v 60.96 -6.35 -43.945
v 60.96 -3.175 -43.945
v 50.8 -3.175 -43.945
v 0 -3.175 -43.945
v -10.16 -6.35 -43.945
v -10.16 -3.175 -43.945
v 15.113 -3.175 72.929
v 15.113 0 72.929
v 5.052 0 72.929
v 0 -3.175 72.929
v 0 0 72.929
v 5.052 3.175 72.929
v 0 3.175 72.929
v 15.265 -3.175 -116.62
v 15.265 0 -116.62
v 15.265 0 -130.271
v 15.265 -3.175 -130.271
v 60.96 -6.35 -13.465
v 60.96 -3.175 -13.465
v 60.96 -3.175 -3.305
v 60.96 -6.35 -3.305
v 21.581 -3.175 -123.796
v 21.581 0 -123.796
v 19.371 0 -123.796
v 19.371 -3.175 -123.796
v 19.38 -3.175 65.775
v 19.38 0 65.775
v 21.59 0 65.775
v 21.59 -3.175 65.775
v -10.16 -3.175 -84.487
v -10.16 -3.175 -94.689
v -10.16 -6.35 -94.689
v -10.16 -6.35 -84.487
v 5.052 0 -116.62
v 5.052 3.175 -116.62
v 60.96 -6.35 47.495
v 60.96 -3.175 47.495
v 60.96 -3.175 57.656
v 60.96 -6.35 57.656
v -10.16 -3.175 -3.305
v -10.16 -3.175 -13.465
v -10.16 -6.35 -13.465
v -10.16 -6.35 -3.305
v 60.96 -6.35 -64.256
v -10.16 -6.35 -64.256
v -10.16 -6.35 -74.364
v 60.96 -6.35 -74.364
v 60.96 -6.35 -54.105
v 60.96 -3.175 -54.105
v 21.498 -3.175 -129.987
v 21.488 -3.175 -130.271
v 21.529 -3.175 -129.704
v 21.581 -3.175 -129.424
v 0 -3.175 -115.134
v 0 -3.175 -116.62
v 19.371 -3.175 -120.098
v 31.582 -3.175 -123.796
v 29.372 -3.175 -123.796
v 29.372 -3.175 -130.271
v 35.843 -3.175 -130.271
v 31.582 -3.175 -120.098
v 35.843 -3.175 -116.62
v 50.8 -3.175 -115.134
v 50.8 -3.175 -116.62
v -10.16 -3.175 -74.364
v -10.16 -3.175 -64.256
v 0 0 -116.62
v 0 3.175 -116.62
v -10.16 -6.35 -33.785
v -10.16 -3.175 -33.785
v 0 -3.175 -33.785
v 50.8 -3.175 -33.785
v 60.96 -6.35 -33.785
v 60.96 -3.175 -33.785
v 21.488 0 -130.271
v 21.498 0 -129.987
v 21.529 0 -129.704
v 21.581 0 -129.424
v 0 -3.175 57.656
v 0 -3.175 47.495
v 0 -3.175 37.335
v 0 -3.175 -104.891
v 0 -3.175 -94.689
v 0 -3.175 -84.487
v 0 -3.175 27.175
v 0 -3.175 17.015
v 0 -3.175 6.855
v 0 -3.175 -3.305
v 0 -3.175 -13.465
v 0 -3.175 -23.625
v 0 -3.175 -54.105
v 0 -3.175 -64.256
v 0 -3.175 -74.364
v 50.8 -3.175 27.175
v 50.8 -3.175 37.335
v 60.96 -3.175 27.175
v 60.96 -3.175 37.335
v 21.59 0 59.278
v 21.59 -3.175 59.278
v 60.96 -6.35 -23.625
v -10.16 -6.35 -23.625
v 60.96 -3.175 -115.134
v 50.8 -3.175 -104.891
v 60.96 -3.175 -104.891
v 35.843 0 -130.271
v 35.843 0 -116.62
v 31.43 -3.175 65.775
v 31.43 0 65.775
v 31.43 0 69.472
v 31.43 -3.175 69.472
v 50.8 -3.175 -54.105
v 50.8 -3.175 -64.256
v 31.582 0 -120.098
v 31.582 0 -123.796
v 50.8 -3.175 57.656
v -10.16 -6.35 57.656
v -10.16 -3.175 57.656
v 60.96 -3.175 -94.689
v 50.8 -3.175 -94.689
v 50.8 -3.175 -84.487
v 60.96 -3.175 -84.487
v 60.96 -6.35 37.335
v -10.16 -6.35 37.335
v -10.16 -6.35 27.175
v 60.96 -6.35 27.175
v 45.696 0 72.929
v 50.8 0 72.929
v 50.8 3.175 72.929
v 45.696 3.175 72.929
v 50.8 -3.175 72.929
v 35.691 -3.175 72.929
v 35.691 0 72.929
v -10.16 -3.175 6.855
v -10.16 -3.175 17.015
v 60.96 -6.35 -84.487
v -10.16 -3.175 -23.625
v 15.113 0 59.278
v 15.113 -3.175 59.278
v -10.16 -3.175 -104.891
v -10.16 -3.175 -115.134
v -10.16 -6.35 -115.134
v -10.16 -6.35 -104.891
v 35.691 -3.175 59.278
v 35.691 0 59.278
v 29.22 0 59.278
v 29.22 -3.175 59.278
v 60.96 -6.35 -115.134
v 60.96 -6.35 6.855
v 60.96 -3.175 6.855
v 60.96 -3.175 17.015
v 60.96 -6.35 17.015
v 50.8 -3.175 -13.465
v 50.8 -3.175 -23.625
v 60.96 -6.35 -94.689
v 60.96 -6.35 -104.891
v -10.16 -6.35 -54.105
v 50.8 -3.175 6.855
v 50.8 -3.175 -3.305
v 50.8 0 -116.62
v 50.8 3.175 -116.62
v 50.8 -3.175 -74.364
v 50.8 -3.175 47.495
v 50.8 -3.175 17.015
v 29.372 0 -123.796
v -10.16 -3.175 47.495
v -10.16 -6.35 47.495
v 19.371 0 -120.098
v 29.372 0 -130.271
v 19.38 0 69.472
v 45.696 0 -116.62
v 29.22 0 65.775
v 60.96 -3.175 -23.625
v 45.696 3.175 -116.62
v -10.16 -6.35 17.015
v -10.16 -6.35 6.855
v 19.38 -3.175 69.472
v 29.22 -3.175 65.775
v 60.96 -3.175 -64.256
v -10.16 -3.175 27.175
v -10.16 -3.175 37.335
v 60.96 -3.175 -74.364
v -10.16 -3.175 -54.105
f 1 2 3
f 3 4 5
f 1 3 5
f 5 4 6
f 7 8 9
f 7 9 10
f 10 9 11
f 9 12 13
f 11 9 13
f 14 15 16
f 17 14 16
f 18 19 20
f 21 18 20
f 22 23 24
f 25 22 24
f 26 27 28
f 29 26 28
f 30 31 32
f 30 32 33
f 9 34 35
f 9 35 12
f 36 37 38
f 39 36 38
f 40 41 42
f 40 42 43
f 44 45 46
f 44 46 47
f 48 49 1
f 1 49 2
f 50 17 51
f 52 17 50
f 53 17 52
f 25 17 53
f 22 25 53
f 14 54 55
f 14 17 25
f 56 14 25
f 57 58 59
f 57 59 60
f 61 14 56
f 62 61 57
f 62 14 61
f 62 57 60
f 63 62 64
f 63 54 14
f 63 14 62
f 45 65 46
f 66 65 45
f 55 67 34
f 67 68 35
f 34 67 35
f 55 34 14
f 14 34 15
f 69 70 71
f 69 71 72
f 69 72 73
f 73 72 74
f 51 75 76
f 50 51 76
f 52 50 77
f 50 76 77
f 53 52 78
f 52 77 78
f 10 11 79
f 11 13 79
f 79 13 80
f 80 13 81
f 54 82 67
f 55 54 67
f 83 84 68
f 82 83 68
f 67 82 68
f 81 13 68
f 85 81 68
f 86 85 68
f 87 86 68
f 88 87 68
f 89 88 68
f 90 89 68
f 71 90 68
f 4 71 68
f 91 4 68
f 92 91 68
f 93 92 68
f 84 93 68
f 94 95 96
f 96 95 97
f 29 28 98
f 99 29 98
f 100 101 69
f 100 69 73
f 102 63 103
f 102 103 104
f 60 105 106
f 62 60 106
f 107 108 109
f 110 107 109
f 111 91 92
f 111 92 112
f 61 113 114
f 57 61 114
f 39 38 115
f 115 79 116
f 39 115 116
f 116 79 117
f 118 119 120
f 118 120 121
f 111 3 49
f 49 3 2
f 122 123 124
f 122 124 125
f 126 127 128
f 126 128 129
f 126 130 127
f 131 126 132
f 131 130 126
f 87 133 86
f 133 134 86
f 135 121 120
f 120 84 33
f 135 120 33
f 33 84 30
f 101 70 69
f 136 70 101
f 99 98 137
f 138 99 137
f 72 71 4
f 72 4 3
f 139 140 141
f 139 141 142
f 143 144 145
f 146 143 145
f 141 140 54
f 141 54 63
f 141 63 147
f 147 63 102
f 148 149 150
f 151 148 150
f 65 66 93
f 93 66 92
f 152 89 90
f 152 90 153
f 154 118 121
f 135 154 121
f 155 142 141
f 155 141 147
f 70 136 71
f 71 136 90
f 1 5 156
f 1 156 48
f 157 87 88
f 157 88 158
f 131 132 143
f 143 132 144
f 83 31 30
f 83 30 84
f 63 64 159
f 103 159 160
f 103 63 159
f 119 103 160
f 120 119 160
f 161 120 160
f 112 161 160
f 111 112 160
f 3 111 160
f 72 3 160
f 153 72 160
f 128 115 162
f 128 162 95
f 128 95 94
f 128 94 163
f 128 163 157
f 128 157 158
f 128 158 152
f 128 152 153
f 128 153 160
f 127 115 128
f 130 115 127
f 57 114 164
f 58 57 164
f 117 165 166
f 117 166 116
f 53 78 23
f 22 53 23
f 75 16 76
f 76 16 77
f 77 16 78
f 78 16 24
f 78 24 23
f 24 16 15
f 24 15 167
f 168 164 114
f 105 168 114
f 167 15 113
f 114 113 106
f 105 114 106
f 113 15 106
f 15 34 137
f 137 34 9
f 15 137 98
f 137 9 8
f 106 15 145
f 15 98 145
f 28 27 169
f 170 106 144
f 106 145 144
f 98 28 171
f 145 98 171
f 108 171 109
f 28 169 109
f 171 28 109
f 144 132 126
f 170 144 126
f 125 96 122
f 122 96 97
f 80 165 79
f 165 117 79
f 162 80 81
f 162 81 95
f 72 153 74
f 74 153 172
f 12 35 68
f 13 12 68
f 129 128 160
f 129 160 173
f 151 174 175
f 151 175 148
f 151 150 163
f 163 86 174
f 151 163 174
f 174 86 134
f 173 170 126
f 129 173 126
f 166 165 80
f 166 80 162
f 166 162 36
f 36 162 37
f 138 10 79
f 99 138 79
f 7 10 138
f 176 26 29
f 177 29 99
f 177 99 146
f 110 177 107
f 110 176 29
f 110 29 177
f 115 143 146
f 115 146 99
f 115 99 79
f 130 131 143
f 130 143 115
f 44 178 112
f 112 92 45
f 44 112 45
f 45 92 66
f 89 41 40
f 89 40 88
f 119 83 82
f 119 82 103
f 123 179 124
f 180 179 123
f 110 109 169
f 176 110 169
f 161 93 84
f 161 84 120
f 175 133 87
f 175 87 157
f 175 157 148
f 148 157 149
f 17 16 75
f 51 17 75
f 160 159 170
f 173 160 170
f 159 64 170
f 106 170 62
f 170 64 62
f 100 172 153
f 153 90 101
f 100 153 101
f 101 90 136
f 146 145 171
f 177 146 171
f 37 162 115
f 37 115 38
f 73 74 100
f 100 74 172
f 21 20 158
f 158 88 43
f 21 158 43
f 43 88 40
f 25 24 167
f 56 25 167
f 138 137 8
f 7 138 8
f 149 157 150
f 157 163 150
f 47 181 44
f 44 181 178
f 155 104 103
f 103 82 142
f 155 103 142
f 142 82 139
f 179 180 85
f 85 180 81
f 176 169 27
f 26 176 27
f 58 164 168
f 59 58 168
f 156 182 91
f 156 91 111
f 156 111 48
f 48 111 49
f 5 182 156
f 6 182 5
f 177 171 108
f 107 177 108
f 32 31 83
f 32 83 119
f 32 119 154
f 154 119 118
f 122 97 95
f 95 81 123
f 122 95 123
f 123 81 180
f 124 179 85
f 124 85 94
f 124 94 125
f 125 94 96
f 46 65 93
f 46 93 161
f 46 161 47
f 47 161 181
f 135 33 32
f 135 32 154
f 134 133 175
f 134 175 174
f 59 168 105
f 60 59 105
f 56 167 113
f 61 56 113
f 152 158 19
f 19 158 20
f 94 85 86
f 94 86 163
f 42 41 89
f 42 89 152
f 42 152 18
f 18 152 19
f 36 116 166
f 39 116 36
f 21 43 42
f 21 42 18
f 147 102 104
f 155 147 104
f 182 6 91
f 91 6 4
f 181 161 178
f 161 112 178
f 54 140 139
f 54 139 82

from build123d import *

# Parameters (mm, degrees)
F1_DEPTH = 3.175
F2_W     = 50.8
F2_H     = 10.1607441902
F2_W_2   = 10.16
F2_H_2   = 10.16
F2_H_3   = 10.1088657975
F2_H_4   = 10.2023631334
F3_DEPTH = 3.175
F2_H_5   = 10.2422460914
F4_DEPTH = 3.175
F5_W     = 5.1035365641
F5_H     = 189.5493796663
F5_W_2   = 5.0522950478
F6_DEPTH = 3.175


with BuildPart() as f1:
    # F0 (on Front) → F1 (new body)
    with BuildSketch(Plane.XZ):
        with BuildLine():
            Line((25.5517161727, -116.6203990579), (15.2647161727, -116.6203990579))
            Line((15.2647161727, -116.6203990579), (15.2647161727, -130.2710193916))
            Line((15.2647161727, -130.2710193916), (21.4880950641, -130.2710193916))
            ThreePointArc((21.4880950641, -130.2710193916), (21.5113434052, -129.8451671692), (21.5808121, -129.4243766025))
            Line((21.5808121, -129.4243766025), (21.5808121, -123.7957928851))
            Line((21.5808121, -123.7957928851), (19.3710121, -123.7957928851))
            Line((19.3710121, -123.7957928851), (19.3710121, -120.0983975604))
            Line((19.3710121, -120.0983975604), (31.5819798807, -120.0983975604))
            Line((31.5819798807, -120.0983975604), (31.5819798807, -123.7957928851))
            Line((31.5819798807, -123.7957928851), (29.3721798807, -123.7957928851))
            Line((29.3721798807, -123.7957928851), (29.3721798807, -130.2710193916))
            Line((29.3721798807, -130.2710193916), (35.8426272869, -130.2710193916))
            Line((35.8426272869, -130.2710193916), (35.8426272869, -116.6203990579))
            Line((35.8426272869, -116.6203990579), (25.5517161727, -116.6203990579))
        make_face()
        Polygon((15.113, 72.9289806084), (0, 72.9289806084), (0, -116.6203990579), (15.2647161727, -116.6203990579), (25.5517161727, -116.6203990579), (35.8426272869, -116.6203990579), (50.8, -116.6203990579), (50.8, 72.9289806084), (35.6909111142, 72.9289806084), (35.6909111142, 59.2783602747), (29.220463708, 59.2783602747), (29.220463708, 65.7749548554), (31.430263708, 65.7749548554), (31.430263708, 69.4723501801), (19.3802, 69.4723501801), (19.3802, 65.7749548554), (21.59, 65.7749548554), (21.59, 59.2783602747), (15.113, 59.2783602747), align=None)
    extrude(amount=F1_DEPTH)

    # F2 (on face) → F3 (join)
    with BuildSketch(Plane.XZ.offset(3.175)):
        with Locations((25.4, 52.5756378829)):
            Rectangle(F2_W, F2_H)
        with Locations((55.88, 52.5756378829)):
            Rectangle(F2_W_2, F2_H)
        with Locations((-5.08, 52.5756378829)):
            Rectangle(F2_W_2, F2_H)
        with Locations((-5.08, 32.2552657878)):
            Rectangle(F2_W_2, F2_H_2)
        with Locations((25.4, 32.2552657878)):
            Rectangle(F2_W, F2_H_2)
        with Locations((55.88, 32.2552657878)):
            Rectangle(F2_W_2, F2_H_2)
        with Locations((55.88, 11.9352657878)):
            Rectangle(F2_W_2, F2_H_2)
        with Locations((25.4, 11.9352657878)):
            Rectangle(F2_W, F2_H_2)
        with Locations((-5.08, 11.9352657878)):
            Rectangle(F2_W_2, F2_H_2)
        with Locations((-5.08, -8.3847342122)):
            Rectangle(F2_W_2, F2_H_2)
        with Locations((25.4, -8.3847342122)):
            Rectangle(F2_W, F2_H_2)
        with Locations((55.88, -8.3847342122)):
            Rectangle(F2_W_2, F2_H_2)
        with Locations((55.88, -28.7047342122)):
            Rectangle(F2_W_2, F2_H_2)
        with Locations((25.4, -28.7047342122)):
            Rectangle(F2_W, F2_H_2)
        with Locations((-5.08, -28.7047342122)):
            Rectangle(F2_W_2, F2_H_2)
        with Locations((-5.08, -49.0247342122)):
            Rectangle(F2_W_2, F2_H_2)
        with Locations((25.4, -49.0247342122)):
            Rectangle(F2_W, F2_H_2)
        with Locations((55.88, -49.0247342122)):
            Rectangle(F2_W_2, F2_H_2)
        with Locations((55.88, -69.310028106)):
            Rectangle(F2_W_2, F2_H_3)
        with Locations((25.4, -69.310028106)):
            Rectangle(F2_W, F2_H_3)
        with Locations((-5.08, -69.310028106)):
            Rectangle(F2_W_2, F2_H_3)
        with Locations((-5.08, -89.587919414)):
            Rectangle(F2_W_2, F2_H_4)
        with Locations((25.4, -89.587919414)):
            Rectangle(F2_W, F2_H_4)
        with Locations((55.88, -89.587919414)):
            Rectangle(F2_W_2, F2_H_4)
    extrude(amount=F3_DEPTH)

    # F2 (on face) → F4 (join)
    with BuildSketch(Plane.XZ.offset(3.175)):
        with Locations((25.4, -110.0125946105)):
            Rectangle(F2_W, F2_H_5)
        with Locations((55.88, -110.0125946105)):
            Rectangle(F2_W_2, F2_H_5)
        with Locations((-5.08, -110.0125946105)):
            Rectangle(F2_W_2, F2_H_5)
    extrude(amount=F4_DEPTH)

    # F5 (on face) → F6 (join)
    with BuildSketch(Plane(origin=(0, 0, 0), x_dir=(-1, 0, 0), z_dir=(0, 1, 0))):
        with Locations((-48.2482317179, -21.8457092247)):
            Rectangle(F5_W, F5_H)
        with Locations((-2.5261475239, -21.8457092247)):
            Rectangle(F5_W_2, F5_H)
    extrude(amount=F6_DEPTH)


solid = f1.part
